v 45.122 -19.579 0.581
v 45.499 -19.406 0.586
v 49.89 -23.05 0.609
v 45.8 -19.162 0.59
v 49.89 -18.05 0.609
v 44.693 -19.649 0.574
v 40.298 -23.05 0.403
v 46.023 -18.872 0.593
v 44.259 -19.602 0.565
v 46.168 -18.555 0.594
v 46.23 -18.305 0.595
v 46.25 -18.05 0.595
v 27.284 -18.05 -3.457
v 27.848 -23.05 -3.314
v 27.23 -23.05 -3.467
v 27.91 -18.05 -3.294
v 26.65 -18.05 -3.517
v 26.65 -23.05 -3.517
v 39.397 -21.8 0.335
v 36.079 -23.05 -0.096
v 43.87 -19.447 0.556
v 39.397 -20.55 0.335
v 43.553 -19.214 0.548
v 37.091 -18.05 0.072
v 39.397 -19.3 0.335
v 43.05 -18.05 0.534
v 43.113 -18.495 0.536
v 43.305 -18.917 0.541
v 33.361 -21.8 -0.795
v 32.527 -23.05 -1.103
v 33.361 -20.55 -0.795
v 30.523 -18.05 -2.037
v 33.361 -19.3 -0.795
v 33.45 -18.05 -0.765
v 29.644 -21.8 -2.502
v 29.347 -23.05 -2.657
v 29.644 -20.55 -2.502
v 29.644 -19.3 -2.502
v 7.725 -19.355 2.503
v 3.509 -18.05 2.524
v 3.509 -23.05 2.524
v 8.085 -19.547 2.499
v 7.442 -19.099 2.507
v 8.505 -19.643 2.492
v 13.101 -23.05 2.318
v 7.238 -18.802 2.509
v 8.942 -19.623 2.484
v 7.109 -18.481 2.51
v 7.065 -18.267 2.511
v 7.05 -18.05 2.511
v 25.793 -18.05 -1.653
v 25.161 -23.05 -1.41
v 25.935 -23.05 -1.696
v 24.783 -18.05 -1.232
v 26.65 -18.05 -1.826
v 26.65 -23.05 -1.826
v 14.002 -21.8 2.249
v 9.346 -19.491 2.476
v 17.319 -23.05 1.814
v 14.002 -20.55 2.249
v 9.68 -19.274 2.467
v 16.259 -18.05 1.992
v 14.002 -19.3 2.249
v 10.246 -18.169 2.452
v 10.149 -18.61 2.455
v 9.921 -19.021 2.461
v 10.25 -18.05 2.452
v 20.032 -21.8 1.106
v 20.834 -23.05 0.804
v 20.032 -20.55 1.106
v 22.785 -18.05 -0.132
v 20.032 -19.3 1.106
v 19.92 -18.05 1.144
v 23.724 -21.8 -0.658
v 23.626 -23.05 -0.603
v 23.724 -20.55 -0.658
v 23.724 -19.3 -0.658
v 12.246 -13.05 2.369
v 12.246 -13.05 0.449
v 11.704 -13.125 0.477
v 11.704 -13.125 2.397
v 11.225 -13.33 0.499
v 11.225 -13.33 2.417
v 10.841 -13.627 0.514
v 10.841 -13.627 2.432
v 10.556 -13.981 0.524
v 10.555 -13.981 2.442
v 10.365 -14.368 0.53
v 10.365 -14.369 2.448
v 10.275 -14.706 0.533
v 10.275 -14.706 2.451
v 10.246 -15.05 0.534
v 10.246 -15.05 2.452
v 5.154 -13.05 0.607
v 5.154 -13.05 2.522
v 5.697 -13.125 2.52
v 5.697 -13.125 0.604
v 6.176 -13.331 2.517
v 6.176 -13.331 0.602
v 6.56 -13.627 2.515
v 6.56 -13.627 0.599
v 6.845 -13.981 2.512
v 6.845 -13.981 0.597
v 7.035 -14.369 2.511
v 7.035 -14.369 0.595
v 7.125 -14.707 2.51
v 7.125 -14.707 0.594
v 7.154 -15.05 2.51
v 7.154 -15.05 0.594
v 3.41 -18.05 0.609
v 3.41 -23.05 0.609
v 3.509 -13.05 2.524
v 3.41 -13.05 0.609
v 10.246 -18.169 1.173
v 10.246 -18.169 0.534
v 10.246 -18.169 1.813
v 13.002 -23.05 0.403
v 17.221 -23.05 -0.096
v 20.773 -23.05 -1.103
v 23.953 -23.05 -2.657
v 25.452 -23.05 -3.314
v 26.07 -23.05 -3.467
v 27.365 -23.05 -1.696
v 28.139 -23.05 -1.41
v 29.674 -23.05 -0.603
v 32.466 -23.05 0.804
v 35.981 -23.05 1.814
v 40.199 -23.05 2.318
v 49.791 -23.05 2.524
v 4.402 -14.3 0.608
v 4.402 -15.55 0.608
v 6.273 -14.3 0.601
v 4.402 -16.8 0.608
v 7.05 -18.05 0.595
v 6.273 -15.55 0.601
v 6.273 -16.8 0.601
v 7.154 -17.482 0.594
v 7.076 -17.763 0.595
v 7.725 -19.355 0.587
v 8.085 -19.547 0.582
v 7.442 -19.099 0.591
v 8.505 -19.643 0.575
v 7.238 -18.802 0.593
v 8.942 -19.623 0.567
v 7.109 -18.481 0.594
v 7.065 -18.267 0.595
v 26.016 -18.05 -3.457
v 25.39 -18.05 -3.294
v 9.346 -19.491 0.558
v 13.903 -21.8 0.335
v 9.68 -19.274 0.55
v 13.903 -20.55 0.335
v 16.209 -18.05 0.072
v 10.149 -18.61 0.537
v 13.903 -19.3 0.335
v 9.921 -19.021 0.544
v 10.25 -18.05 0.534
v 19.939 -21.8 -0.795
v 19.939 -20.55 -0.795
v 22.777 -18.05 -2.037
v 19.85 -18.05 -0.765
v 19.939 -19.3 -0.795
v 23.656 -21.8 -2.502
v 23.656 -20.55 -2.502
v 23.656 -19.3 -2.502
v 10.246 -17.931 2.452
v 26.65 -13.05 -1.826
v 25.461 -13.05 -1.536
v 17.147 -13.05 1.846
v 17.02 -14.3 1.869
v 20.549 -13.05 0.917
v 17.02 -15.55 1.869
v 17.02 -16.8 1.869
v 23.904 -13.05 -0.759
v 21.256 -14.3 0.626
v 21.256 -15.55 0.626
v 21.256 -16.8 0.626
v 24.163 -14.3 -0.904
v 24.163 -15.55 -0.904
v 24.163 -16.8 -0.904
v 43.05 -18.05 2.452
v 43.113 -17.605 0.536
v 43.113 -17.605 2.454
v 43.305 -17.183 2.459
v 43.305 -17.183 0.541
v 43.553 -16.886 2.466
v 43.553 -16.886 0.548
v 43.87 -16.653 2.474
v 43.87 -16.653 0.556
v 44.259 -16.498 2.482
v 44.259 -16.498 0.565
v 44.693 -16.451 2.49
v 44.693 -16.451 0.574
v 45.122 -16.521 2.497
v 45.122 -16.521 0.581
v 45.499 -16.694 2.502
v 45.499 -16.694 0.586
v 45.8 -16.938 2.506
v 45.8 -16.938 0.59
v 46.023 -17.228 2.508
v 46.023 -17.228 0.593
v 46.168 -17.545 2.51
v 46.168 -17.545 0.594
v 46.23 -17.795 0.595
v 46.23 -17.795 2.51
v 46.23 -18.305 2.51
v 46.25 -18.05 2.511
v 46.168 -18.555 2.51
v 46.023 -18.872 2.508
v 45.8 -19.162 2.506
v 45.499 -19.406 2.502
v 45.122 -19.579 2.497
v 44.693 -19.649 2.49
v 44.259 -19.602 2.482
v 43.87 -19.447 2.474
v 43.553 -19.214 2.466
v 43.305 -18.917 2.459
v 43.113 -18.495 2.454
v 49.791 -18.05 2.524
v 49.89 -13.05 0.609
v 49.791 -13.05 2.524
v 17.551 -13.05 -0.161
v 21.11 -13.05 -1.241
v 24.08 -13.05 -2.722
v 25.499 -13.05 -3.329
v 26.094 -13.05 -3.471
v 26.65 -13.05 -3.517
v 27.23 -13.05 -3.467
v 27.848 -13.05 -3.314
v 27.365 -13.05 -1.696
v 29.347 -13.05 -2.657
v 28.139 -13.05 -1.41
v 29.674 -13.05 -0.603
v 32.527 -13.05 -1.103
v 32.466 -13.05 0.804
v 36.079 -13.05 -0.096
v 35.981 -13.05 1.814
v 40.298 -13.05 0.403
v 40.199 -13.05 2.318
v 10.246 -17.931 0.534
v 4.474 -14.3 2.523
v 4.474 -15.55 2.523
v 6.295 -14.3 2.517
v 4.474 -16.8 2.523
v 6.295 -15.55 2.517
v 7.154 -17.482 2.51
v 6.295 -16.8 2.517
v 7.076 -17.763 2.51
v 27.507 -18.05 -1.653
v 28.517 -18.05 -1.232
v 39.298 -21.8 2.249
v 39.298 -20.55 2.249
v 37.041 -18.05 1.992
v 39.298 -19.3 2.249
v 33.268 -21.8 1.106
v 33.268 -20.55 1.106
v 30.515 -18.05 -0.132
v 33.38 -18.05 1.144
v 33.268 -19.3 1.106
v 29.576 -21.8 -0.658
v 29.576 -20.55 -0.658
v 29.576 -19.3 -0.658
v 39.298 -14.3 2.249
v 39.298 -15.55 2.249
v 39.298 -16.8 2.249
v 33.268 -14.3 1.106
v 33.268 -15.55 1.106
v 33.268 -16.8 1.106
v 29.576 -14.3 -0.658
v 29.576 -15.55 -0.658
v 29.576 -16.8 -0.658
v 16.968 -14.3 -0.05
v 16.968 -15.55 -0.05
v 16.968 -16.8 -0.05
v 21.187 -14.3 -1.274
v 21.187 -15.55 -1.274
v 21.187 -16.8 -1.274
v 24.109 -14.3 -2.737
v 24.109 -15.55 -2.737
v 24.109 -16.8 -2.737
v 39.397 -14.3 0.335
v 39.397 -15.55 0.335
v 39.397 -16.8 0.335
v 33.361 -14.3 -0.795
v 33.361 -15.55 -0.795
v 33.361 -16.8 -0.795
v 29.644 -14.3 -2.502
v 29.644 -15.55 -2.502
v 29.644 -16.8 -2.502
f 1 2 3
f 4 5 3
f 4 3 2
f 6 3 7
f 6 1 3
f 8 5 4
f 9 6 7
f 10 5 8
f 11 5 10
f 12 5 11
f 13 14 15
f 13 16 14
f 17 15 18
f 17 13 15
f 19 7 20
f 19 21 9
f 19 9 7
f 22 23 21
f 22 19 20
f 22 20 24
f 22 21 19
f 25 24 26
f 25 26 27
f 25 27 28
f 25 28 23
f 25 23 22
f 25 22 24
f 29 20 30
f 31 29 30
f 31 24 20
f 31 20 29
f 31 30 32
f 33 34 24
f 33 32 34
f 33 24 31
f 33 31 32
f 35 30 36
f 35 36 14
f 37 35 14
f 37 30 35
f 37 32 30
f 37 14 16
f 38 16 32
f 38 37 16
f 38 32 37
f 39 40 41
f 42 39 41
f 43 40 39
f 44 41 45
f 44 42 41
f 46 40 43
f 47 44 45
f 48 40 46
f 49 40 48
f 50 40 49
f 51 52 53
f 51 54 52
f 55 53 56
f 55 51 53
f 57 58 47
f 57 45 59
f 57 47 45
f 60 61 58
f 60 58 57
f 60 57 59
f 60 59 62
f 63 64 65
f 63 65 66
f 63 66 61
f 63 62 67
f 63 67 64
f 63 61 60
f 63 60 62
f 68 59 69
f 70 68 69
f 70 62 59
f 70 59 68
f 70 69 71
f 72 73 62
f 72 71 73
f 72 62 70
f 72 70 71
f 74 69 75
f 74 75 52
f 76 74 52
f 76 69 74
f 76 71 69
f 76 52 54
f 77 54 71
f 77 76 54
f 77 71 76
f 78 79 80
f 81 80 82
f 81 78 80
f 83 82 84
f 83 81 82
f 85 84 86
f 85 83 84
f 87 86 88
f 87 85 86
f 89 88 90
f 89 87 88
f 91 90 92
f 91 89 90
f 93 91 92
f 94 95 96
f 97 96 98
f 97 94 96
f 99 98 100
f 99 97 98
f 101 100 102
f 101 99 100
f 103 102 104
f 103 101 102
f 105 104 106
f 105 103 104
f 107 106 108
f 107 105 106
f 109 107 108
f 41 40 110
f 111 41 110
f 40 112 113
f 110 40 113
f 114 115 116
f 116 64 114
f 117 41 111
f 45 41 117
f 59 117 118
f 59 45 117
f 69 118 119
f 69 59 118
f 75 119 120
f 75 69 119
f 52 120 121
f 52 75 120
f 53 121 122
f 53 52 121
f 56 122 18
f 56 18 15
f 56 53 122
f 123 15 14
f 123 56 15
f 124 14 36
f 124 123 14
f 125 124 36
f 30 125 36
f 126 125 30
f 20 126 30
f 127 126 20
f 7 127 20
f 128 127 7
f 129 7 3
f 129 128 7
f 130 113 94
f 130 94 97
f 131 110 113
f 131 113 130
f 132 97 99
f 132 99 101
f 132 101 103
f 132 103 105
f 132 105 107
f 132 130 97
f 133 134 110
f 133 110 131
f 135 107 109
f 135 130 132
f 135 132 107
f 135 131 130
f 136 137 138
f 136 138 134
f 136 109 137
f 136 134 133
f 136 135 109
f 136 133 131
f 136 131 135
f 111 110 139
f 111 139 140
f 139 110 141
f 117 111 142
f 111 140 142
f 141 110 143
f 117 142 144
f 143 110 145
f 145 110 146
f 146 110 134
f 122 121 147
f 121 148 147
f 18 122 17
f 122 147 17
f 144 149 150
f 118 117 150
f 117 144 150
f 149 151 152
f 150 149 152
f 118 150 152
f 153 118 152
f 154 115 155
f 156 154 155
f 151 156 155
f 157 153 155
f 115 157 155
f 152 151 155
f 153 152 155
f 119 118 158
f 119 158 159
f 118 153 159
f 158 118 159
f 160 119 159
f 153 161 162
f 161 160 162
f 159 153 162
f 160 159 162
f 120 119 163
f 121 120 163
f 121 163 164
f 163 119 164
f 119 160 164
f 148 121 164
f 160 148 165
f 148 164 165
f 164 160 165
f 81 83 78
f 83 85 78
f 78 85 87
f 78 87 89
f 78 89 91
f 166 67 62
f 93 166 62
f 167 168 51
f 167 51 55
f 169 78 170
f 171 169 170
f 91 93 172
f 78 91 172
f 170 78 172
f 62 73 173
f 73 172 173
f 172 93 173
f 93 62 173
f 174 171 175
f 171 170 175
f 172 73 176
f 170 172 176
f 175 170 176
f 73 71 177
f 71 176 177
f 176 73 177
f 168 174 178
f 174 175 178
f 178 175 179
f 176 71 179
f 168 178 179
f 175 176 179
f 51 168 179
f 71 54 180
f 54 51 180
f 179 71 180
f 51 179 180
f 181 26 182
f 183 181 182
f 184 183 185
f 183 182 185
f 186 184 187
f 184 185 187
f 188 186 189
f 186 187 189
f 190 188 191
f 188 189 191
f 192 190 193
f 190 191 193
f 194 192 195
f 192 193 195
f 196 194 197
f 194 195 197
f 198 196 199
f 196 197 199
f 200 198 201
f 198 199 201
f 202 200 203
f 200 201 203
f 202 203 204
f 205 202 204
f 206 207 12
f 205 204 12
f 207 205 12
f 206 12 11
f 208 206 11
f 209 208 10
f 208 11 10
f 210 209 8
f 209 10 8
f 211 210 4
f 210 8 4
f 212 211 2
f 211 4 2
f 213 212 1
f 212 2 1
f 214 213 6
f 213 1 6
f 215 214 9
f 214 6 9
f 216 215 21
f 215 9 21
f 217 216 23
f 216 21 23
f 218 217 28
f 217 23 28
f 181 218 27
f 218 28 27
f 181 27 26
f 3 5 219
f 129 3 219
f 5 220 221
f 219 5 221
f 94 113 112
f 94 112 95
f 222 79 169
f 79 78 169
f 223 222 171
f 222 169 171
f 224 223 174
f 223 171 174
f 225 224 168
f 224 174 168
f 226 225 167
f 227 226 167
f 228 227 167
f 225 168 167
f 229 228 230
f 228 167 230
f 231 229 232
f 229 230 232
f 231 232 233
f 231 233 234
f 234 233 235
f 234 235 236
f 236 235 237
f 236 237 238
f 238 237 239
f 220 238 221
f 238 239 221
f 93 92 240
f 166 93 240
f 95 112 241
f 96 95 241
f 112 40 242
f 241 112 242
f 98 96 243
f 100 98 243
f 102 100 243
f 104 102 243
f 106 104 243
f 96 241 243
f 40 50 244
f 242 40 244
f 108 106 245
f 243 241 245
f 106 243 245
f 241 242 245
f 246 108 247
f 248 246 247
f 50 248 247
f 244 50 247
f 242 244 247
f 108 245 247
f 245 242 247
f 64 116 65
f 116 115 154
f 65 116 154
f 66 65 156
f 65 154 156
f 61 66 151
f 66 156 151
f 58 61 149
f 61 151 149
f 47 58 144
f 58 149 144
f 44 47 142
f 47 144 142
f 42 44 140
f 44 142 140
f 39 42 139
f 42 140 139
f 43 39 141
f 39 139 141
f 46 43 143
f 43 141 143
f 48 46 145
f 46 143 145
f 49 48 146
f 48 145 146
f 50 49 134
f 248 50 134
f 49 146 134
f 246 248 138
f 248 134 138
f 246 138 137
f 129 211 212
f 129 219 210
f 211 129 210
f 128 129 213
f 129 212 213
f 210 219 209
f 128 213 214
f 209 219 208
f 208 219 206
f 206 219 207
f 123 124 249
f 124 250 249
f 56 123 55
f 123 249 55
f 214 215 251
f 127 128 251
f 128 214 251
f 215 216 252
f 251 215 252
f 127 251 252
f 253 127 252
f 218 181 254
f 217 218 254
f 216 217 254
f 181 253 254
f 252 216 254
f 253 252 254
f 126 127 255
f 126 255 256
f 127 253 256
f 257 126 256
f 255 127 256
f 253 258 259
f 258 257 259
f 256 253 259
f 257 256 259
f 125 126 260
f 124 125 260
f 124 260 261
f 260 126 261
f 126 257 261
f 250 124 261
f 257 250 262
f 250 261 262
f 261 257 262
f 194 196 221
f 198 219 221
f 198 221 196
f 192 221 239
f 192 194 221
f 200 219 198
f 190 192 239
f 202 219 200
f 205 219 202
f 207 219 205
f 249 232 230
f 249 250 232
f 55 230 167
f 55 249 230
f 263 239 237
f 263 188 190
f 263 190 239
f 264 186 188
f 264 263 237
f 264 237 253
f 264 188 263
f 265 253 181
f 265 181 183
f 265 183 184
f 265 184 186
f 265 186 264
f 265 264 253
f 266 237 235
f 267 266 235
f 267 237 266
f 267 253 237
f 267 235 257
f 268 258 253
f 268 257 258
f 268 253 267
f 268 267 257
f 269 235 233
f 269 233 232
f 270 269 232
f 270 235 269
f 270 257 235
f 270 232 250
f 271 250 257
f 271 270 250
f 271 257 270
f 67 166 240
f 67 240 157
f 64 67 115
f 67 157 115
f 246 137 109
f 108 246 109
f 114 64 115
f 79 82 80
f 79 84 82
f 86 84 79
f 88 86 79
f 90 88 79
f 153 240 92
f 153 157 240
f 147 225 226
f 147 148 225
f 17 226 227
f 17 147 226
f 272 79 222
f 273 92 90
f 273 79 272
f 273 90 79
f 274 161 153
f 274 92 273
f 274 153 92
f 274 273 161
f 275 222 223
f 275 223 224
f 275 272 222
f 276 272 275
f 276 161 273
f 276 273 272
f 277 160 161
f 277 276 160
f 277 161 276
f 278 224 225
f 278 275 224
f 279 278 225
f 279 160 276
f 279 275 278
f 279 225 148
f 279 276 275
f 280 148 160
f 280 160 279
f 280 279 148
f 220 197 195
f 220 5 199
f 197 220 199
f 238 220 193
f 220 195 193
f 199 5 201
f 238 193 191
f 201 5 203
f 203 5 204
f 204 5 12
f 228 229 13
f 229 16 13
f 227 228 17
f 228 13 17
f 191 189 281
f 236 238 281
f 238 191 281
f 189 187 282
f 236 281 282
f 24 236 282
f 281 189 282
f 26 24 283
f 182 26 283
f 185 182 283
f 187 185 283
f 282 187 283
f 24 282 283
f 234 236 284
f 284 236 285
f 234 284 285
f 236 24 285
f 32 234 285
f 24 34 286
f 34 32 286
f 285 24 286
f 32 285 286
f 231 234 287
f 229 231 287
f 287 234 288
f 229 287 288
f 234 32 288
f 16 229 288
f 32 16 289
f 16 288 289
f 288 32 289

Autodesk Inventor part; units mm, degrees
ref_plane "YZ Plane" through (0, 0, 0) normal (1, 0, 0) x (0, 1, 0)
ref_plane "XZ Plane" through (0, 0, 0) normal (0, 1, 0) x (-1, 0, 0)
ref_plane "XY Plane" through (0, 0, 0) normal (0, 0, 1) x (1, 0, 0)
ref_plane "Arbeitsebene1" through (-42.5, -18.05, -10) normal (0, -1, 0) x (1, 0, 0)
sketch "Skizze1" plane through (-42.5, -18.05, -10) normal (0, -1, 0) x (1, 0, 0)
  line L0 (45.91, 10.609) -> (59.4818, 10.609) construction
  line L1 (59.4818, 10.609) -> (63.5906, 10.303) construction
  line L2 (63.5906, 10.303) -> (66.1223, 6.4827) construction
  line L3 (66.1223, 6.4827) -> (69.15, 6.4827) construction
  spline S0 degree 4 poles (45.91, 10.609) (59.4818, 10.609) (63.5906, 10.303) (66.1223, 6.4827) (69.15, 6.4827) knots 1 1 1 1 1 2 2 2 2 2
  line L4 (46.0094, 12.5239) -> (59.5812, 12.5239) construction
  line L5 (59.5812, 12.5239) -> (63.69, 12.218) construction
  line L6 (63.69, 12.218) -> (66.2218, 8.3976) construction
  line L7 (66.2218, 8.3976) -> (69.15, 8.1737) construction
  spline S1 degree 4 poles (46.0094, 12.5239) (59.5812, 12.5239) (63.69, 12.218) (66.2218, 8.3976) (69.15, 8.1737) knots 1 1 1 1 1 2 2 2 2 2
  line L8 (46.0094, 12.5239) -> (45.91, 10.609)
  line L9 (69.15, 8.1737) -> (69.15, 6.4827)
  line L10 (42.5, 16.2648) -> (42.5, 4.43) projected
  point P0 (54.5567, 11.9133)
extrude "Extrusion1" add sketch "Skizze1" along normal mid plane 10
ref_plane "Arbeitsebene2" through (0, 0, 0) normal (0, 0, 1) x (1, 0, 0)
sketch "Skizze2" plane through (0, 0, 0) normal (0, 0, 1) x (1, 0, 0)
  line L0 (12.3, -18.05) -> (-2.05, -18.05) projected
  circle A0 centre (8.65, -14) radius 1.4 projected
  circle A1 centre (8.65, -18.05) radius 1.6
  point P0 (0, 0)
  dimension "d2" = 3.2
extrude "Extrusion2" cut sketch "Skizze2" along normal mid plane 10 contours A1 L0 | L0 A1
mirror "Spiegeln1" about plane through (26.65, -18.05, -3.5173) normal (1, 0, 0) of "Extrusion1", "Extrusion2"
sketch "Skizze3" plane through (0, 0, 0) normal (0, 0, 1) x (1, 0, 0)
  line L0 (10.2456, -18.1688) -> (7.1543, -18.1688)
  line L1 (7.1543, -18.1688) -> (7.1543, 0.1733)
  line L2 (7.1543, 0.1733) -> (10.2456, 0.1733)
  line L3 (10.2456, 0.1733) -> (10.2456, -18.1688)
  point P0 (0, 0)
  point P1 (7.1543, -17.4817)
extrude "Extrusion3" cut sketch "Skizze3" along normal mid plane 10
fillet "Rundung1" radius 2 2 edges at (10.2456, -13.05, 1.4929) (7.1543, -13.05, 1.5517)
ref_plane "Arbeitsebene3" through (53.3, 0, 0) normal (0, 0, -1) x (-1, 0, 0)
properties part number "60_Planktoscope_Sampleholder_2"
